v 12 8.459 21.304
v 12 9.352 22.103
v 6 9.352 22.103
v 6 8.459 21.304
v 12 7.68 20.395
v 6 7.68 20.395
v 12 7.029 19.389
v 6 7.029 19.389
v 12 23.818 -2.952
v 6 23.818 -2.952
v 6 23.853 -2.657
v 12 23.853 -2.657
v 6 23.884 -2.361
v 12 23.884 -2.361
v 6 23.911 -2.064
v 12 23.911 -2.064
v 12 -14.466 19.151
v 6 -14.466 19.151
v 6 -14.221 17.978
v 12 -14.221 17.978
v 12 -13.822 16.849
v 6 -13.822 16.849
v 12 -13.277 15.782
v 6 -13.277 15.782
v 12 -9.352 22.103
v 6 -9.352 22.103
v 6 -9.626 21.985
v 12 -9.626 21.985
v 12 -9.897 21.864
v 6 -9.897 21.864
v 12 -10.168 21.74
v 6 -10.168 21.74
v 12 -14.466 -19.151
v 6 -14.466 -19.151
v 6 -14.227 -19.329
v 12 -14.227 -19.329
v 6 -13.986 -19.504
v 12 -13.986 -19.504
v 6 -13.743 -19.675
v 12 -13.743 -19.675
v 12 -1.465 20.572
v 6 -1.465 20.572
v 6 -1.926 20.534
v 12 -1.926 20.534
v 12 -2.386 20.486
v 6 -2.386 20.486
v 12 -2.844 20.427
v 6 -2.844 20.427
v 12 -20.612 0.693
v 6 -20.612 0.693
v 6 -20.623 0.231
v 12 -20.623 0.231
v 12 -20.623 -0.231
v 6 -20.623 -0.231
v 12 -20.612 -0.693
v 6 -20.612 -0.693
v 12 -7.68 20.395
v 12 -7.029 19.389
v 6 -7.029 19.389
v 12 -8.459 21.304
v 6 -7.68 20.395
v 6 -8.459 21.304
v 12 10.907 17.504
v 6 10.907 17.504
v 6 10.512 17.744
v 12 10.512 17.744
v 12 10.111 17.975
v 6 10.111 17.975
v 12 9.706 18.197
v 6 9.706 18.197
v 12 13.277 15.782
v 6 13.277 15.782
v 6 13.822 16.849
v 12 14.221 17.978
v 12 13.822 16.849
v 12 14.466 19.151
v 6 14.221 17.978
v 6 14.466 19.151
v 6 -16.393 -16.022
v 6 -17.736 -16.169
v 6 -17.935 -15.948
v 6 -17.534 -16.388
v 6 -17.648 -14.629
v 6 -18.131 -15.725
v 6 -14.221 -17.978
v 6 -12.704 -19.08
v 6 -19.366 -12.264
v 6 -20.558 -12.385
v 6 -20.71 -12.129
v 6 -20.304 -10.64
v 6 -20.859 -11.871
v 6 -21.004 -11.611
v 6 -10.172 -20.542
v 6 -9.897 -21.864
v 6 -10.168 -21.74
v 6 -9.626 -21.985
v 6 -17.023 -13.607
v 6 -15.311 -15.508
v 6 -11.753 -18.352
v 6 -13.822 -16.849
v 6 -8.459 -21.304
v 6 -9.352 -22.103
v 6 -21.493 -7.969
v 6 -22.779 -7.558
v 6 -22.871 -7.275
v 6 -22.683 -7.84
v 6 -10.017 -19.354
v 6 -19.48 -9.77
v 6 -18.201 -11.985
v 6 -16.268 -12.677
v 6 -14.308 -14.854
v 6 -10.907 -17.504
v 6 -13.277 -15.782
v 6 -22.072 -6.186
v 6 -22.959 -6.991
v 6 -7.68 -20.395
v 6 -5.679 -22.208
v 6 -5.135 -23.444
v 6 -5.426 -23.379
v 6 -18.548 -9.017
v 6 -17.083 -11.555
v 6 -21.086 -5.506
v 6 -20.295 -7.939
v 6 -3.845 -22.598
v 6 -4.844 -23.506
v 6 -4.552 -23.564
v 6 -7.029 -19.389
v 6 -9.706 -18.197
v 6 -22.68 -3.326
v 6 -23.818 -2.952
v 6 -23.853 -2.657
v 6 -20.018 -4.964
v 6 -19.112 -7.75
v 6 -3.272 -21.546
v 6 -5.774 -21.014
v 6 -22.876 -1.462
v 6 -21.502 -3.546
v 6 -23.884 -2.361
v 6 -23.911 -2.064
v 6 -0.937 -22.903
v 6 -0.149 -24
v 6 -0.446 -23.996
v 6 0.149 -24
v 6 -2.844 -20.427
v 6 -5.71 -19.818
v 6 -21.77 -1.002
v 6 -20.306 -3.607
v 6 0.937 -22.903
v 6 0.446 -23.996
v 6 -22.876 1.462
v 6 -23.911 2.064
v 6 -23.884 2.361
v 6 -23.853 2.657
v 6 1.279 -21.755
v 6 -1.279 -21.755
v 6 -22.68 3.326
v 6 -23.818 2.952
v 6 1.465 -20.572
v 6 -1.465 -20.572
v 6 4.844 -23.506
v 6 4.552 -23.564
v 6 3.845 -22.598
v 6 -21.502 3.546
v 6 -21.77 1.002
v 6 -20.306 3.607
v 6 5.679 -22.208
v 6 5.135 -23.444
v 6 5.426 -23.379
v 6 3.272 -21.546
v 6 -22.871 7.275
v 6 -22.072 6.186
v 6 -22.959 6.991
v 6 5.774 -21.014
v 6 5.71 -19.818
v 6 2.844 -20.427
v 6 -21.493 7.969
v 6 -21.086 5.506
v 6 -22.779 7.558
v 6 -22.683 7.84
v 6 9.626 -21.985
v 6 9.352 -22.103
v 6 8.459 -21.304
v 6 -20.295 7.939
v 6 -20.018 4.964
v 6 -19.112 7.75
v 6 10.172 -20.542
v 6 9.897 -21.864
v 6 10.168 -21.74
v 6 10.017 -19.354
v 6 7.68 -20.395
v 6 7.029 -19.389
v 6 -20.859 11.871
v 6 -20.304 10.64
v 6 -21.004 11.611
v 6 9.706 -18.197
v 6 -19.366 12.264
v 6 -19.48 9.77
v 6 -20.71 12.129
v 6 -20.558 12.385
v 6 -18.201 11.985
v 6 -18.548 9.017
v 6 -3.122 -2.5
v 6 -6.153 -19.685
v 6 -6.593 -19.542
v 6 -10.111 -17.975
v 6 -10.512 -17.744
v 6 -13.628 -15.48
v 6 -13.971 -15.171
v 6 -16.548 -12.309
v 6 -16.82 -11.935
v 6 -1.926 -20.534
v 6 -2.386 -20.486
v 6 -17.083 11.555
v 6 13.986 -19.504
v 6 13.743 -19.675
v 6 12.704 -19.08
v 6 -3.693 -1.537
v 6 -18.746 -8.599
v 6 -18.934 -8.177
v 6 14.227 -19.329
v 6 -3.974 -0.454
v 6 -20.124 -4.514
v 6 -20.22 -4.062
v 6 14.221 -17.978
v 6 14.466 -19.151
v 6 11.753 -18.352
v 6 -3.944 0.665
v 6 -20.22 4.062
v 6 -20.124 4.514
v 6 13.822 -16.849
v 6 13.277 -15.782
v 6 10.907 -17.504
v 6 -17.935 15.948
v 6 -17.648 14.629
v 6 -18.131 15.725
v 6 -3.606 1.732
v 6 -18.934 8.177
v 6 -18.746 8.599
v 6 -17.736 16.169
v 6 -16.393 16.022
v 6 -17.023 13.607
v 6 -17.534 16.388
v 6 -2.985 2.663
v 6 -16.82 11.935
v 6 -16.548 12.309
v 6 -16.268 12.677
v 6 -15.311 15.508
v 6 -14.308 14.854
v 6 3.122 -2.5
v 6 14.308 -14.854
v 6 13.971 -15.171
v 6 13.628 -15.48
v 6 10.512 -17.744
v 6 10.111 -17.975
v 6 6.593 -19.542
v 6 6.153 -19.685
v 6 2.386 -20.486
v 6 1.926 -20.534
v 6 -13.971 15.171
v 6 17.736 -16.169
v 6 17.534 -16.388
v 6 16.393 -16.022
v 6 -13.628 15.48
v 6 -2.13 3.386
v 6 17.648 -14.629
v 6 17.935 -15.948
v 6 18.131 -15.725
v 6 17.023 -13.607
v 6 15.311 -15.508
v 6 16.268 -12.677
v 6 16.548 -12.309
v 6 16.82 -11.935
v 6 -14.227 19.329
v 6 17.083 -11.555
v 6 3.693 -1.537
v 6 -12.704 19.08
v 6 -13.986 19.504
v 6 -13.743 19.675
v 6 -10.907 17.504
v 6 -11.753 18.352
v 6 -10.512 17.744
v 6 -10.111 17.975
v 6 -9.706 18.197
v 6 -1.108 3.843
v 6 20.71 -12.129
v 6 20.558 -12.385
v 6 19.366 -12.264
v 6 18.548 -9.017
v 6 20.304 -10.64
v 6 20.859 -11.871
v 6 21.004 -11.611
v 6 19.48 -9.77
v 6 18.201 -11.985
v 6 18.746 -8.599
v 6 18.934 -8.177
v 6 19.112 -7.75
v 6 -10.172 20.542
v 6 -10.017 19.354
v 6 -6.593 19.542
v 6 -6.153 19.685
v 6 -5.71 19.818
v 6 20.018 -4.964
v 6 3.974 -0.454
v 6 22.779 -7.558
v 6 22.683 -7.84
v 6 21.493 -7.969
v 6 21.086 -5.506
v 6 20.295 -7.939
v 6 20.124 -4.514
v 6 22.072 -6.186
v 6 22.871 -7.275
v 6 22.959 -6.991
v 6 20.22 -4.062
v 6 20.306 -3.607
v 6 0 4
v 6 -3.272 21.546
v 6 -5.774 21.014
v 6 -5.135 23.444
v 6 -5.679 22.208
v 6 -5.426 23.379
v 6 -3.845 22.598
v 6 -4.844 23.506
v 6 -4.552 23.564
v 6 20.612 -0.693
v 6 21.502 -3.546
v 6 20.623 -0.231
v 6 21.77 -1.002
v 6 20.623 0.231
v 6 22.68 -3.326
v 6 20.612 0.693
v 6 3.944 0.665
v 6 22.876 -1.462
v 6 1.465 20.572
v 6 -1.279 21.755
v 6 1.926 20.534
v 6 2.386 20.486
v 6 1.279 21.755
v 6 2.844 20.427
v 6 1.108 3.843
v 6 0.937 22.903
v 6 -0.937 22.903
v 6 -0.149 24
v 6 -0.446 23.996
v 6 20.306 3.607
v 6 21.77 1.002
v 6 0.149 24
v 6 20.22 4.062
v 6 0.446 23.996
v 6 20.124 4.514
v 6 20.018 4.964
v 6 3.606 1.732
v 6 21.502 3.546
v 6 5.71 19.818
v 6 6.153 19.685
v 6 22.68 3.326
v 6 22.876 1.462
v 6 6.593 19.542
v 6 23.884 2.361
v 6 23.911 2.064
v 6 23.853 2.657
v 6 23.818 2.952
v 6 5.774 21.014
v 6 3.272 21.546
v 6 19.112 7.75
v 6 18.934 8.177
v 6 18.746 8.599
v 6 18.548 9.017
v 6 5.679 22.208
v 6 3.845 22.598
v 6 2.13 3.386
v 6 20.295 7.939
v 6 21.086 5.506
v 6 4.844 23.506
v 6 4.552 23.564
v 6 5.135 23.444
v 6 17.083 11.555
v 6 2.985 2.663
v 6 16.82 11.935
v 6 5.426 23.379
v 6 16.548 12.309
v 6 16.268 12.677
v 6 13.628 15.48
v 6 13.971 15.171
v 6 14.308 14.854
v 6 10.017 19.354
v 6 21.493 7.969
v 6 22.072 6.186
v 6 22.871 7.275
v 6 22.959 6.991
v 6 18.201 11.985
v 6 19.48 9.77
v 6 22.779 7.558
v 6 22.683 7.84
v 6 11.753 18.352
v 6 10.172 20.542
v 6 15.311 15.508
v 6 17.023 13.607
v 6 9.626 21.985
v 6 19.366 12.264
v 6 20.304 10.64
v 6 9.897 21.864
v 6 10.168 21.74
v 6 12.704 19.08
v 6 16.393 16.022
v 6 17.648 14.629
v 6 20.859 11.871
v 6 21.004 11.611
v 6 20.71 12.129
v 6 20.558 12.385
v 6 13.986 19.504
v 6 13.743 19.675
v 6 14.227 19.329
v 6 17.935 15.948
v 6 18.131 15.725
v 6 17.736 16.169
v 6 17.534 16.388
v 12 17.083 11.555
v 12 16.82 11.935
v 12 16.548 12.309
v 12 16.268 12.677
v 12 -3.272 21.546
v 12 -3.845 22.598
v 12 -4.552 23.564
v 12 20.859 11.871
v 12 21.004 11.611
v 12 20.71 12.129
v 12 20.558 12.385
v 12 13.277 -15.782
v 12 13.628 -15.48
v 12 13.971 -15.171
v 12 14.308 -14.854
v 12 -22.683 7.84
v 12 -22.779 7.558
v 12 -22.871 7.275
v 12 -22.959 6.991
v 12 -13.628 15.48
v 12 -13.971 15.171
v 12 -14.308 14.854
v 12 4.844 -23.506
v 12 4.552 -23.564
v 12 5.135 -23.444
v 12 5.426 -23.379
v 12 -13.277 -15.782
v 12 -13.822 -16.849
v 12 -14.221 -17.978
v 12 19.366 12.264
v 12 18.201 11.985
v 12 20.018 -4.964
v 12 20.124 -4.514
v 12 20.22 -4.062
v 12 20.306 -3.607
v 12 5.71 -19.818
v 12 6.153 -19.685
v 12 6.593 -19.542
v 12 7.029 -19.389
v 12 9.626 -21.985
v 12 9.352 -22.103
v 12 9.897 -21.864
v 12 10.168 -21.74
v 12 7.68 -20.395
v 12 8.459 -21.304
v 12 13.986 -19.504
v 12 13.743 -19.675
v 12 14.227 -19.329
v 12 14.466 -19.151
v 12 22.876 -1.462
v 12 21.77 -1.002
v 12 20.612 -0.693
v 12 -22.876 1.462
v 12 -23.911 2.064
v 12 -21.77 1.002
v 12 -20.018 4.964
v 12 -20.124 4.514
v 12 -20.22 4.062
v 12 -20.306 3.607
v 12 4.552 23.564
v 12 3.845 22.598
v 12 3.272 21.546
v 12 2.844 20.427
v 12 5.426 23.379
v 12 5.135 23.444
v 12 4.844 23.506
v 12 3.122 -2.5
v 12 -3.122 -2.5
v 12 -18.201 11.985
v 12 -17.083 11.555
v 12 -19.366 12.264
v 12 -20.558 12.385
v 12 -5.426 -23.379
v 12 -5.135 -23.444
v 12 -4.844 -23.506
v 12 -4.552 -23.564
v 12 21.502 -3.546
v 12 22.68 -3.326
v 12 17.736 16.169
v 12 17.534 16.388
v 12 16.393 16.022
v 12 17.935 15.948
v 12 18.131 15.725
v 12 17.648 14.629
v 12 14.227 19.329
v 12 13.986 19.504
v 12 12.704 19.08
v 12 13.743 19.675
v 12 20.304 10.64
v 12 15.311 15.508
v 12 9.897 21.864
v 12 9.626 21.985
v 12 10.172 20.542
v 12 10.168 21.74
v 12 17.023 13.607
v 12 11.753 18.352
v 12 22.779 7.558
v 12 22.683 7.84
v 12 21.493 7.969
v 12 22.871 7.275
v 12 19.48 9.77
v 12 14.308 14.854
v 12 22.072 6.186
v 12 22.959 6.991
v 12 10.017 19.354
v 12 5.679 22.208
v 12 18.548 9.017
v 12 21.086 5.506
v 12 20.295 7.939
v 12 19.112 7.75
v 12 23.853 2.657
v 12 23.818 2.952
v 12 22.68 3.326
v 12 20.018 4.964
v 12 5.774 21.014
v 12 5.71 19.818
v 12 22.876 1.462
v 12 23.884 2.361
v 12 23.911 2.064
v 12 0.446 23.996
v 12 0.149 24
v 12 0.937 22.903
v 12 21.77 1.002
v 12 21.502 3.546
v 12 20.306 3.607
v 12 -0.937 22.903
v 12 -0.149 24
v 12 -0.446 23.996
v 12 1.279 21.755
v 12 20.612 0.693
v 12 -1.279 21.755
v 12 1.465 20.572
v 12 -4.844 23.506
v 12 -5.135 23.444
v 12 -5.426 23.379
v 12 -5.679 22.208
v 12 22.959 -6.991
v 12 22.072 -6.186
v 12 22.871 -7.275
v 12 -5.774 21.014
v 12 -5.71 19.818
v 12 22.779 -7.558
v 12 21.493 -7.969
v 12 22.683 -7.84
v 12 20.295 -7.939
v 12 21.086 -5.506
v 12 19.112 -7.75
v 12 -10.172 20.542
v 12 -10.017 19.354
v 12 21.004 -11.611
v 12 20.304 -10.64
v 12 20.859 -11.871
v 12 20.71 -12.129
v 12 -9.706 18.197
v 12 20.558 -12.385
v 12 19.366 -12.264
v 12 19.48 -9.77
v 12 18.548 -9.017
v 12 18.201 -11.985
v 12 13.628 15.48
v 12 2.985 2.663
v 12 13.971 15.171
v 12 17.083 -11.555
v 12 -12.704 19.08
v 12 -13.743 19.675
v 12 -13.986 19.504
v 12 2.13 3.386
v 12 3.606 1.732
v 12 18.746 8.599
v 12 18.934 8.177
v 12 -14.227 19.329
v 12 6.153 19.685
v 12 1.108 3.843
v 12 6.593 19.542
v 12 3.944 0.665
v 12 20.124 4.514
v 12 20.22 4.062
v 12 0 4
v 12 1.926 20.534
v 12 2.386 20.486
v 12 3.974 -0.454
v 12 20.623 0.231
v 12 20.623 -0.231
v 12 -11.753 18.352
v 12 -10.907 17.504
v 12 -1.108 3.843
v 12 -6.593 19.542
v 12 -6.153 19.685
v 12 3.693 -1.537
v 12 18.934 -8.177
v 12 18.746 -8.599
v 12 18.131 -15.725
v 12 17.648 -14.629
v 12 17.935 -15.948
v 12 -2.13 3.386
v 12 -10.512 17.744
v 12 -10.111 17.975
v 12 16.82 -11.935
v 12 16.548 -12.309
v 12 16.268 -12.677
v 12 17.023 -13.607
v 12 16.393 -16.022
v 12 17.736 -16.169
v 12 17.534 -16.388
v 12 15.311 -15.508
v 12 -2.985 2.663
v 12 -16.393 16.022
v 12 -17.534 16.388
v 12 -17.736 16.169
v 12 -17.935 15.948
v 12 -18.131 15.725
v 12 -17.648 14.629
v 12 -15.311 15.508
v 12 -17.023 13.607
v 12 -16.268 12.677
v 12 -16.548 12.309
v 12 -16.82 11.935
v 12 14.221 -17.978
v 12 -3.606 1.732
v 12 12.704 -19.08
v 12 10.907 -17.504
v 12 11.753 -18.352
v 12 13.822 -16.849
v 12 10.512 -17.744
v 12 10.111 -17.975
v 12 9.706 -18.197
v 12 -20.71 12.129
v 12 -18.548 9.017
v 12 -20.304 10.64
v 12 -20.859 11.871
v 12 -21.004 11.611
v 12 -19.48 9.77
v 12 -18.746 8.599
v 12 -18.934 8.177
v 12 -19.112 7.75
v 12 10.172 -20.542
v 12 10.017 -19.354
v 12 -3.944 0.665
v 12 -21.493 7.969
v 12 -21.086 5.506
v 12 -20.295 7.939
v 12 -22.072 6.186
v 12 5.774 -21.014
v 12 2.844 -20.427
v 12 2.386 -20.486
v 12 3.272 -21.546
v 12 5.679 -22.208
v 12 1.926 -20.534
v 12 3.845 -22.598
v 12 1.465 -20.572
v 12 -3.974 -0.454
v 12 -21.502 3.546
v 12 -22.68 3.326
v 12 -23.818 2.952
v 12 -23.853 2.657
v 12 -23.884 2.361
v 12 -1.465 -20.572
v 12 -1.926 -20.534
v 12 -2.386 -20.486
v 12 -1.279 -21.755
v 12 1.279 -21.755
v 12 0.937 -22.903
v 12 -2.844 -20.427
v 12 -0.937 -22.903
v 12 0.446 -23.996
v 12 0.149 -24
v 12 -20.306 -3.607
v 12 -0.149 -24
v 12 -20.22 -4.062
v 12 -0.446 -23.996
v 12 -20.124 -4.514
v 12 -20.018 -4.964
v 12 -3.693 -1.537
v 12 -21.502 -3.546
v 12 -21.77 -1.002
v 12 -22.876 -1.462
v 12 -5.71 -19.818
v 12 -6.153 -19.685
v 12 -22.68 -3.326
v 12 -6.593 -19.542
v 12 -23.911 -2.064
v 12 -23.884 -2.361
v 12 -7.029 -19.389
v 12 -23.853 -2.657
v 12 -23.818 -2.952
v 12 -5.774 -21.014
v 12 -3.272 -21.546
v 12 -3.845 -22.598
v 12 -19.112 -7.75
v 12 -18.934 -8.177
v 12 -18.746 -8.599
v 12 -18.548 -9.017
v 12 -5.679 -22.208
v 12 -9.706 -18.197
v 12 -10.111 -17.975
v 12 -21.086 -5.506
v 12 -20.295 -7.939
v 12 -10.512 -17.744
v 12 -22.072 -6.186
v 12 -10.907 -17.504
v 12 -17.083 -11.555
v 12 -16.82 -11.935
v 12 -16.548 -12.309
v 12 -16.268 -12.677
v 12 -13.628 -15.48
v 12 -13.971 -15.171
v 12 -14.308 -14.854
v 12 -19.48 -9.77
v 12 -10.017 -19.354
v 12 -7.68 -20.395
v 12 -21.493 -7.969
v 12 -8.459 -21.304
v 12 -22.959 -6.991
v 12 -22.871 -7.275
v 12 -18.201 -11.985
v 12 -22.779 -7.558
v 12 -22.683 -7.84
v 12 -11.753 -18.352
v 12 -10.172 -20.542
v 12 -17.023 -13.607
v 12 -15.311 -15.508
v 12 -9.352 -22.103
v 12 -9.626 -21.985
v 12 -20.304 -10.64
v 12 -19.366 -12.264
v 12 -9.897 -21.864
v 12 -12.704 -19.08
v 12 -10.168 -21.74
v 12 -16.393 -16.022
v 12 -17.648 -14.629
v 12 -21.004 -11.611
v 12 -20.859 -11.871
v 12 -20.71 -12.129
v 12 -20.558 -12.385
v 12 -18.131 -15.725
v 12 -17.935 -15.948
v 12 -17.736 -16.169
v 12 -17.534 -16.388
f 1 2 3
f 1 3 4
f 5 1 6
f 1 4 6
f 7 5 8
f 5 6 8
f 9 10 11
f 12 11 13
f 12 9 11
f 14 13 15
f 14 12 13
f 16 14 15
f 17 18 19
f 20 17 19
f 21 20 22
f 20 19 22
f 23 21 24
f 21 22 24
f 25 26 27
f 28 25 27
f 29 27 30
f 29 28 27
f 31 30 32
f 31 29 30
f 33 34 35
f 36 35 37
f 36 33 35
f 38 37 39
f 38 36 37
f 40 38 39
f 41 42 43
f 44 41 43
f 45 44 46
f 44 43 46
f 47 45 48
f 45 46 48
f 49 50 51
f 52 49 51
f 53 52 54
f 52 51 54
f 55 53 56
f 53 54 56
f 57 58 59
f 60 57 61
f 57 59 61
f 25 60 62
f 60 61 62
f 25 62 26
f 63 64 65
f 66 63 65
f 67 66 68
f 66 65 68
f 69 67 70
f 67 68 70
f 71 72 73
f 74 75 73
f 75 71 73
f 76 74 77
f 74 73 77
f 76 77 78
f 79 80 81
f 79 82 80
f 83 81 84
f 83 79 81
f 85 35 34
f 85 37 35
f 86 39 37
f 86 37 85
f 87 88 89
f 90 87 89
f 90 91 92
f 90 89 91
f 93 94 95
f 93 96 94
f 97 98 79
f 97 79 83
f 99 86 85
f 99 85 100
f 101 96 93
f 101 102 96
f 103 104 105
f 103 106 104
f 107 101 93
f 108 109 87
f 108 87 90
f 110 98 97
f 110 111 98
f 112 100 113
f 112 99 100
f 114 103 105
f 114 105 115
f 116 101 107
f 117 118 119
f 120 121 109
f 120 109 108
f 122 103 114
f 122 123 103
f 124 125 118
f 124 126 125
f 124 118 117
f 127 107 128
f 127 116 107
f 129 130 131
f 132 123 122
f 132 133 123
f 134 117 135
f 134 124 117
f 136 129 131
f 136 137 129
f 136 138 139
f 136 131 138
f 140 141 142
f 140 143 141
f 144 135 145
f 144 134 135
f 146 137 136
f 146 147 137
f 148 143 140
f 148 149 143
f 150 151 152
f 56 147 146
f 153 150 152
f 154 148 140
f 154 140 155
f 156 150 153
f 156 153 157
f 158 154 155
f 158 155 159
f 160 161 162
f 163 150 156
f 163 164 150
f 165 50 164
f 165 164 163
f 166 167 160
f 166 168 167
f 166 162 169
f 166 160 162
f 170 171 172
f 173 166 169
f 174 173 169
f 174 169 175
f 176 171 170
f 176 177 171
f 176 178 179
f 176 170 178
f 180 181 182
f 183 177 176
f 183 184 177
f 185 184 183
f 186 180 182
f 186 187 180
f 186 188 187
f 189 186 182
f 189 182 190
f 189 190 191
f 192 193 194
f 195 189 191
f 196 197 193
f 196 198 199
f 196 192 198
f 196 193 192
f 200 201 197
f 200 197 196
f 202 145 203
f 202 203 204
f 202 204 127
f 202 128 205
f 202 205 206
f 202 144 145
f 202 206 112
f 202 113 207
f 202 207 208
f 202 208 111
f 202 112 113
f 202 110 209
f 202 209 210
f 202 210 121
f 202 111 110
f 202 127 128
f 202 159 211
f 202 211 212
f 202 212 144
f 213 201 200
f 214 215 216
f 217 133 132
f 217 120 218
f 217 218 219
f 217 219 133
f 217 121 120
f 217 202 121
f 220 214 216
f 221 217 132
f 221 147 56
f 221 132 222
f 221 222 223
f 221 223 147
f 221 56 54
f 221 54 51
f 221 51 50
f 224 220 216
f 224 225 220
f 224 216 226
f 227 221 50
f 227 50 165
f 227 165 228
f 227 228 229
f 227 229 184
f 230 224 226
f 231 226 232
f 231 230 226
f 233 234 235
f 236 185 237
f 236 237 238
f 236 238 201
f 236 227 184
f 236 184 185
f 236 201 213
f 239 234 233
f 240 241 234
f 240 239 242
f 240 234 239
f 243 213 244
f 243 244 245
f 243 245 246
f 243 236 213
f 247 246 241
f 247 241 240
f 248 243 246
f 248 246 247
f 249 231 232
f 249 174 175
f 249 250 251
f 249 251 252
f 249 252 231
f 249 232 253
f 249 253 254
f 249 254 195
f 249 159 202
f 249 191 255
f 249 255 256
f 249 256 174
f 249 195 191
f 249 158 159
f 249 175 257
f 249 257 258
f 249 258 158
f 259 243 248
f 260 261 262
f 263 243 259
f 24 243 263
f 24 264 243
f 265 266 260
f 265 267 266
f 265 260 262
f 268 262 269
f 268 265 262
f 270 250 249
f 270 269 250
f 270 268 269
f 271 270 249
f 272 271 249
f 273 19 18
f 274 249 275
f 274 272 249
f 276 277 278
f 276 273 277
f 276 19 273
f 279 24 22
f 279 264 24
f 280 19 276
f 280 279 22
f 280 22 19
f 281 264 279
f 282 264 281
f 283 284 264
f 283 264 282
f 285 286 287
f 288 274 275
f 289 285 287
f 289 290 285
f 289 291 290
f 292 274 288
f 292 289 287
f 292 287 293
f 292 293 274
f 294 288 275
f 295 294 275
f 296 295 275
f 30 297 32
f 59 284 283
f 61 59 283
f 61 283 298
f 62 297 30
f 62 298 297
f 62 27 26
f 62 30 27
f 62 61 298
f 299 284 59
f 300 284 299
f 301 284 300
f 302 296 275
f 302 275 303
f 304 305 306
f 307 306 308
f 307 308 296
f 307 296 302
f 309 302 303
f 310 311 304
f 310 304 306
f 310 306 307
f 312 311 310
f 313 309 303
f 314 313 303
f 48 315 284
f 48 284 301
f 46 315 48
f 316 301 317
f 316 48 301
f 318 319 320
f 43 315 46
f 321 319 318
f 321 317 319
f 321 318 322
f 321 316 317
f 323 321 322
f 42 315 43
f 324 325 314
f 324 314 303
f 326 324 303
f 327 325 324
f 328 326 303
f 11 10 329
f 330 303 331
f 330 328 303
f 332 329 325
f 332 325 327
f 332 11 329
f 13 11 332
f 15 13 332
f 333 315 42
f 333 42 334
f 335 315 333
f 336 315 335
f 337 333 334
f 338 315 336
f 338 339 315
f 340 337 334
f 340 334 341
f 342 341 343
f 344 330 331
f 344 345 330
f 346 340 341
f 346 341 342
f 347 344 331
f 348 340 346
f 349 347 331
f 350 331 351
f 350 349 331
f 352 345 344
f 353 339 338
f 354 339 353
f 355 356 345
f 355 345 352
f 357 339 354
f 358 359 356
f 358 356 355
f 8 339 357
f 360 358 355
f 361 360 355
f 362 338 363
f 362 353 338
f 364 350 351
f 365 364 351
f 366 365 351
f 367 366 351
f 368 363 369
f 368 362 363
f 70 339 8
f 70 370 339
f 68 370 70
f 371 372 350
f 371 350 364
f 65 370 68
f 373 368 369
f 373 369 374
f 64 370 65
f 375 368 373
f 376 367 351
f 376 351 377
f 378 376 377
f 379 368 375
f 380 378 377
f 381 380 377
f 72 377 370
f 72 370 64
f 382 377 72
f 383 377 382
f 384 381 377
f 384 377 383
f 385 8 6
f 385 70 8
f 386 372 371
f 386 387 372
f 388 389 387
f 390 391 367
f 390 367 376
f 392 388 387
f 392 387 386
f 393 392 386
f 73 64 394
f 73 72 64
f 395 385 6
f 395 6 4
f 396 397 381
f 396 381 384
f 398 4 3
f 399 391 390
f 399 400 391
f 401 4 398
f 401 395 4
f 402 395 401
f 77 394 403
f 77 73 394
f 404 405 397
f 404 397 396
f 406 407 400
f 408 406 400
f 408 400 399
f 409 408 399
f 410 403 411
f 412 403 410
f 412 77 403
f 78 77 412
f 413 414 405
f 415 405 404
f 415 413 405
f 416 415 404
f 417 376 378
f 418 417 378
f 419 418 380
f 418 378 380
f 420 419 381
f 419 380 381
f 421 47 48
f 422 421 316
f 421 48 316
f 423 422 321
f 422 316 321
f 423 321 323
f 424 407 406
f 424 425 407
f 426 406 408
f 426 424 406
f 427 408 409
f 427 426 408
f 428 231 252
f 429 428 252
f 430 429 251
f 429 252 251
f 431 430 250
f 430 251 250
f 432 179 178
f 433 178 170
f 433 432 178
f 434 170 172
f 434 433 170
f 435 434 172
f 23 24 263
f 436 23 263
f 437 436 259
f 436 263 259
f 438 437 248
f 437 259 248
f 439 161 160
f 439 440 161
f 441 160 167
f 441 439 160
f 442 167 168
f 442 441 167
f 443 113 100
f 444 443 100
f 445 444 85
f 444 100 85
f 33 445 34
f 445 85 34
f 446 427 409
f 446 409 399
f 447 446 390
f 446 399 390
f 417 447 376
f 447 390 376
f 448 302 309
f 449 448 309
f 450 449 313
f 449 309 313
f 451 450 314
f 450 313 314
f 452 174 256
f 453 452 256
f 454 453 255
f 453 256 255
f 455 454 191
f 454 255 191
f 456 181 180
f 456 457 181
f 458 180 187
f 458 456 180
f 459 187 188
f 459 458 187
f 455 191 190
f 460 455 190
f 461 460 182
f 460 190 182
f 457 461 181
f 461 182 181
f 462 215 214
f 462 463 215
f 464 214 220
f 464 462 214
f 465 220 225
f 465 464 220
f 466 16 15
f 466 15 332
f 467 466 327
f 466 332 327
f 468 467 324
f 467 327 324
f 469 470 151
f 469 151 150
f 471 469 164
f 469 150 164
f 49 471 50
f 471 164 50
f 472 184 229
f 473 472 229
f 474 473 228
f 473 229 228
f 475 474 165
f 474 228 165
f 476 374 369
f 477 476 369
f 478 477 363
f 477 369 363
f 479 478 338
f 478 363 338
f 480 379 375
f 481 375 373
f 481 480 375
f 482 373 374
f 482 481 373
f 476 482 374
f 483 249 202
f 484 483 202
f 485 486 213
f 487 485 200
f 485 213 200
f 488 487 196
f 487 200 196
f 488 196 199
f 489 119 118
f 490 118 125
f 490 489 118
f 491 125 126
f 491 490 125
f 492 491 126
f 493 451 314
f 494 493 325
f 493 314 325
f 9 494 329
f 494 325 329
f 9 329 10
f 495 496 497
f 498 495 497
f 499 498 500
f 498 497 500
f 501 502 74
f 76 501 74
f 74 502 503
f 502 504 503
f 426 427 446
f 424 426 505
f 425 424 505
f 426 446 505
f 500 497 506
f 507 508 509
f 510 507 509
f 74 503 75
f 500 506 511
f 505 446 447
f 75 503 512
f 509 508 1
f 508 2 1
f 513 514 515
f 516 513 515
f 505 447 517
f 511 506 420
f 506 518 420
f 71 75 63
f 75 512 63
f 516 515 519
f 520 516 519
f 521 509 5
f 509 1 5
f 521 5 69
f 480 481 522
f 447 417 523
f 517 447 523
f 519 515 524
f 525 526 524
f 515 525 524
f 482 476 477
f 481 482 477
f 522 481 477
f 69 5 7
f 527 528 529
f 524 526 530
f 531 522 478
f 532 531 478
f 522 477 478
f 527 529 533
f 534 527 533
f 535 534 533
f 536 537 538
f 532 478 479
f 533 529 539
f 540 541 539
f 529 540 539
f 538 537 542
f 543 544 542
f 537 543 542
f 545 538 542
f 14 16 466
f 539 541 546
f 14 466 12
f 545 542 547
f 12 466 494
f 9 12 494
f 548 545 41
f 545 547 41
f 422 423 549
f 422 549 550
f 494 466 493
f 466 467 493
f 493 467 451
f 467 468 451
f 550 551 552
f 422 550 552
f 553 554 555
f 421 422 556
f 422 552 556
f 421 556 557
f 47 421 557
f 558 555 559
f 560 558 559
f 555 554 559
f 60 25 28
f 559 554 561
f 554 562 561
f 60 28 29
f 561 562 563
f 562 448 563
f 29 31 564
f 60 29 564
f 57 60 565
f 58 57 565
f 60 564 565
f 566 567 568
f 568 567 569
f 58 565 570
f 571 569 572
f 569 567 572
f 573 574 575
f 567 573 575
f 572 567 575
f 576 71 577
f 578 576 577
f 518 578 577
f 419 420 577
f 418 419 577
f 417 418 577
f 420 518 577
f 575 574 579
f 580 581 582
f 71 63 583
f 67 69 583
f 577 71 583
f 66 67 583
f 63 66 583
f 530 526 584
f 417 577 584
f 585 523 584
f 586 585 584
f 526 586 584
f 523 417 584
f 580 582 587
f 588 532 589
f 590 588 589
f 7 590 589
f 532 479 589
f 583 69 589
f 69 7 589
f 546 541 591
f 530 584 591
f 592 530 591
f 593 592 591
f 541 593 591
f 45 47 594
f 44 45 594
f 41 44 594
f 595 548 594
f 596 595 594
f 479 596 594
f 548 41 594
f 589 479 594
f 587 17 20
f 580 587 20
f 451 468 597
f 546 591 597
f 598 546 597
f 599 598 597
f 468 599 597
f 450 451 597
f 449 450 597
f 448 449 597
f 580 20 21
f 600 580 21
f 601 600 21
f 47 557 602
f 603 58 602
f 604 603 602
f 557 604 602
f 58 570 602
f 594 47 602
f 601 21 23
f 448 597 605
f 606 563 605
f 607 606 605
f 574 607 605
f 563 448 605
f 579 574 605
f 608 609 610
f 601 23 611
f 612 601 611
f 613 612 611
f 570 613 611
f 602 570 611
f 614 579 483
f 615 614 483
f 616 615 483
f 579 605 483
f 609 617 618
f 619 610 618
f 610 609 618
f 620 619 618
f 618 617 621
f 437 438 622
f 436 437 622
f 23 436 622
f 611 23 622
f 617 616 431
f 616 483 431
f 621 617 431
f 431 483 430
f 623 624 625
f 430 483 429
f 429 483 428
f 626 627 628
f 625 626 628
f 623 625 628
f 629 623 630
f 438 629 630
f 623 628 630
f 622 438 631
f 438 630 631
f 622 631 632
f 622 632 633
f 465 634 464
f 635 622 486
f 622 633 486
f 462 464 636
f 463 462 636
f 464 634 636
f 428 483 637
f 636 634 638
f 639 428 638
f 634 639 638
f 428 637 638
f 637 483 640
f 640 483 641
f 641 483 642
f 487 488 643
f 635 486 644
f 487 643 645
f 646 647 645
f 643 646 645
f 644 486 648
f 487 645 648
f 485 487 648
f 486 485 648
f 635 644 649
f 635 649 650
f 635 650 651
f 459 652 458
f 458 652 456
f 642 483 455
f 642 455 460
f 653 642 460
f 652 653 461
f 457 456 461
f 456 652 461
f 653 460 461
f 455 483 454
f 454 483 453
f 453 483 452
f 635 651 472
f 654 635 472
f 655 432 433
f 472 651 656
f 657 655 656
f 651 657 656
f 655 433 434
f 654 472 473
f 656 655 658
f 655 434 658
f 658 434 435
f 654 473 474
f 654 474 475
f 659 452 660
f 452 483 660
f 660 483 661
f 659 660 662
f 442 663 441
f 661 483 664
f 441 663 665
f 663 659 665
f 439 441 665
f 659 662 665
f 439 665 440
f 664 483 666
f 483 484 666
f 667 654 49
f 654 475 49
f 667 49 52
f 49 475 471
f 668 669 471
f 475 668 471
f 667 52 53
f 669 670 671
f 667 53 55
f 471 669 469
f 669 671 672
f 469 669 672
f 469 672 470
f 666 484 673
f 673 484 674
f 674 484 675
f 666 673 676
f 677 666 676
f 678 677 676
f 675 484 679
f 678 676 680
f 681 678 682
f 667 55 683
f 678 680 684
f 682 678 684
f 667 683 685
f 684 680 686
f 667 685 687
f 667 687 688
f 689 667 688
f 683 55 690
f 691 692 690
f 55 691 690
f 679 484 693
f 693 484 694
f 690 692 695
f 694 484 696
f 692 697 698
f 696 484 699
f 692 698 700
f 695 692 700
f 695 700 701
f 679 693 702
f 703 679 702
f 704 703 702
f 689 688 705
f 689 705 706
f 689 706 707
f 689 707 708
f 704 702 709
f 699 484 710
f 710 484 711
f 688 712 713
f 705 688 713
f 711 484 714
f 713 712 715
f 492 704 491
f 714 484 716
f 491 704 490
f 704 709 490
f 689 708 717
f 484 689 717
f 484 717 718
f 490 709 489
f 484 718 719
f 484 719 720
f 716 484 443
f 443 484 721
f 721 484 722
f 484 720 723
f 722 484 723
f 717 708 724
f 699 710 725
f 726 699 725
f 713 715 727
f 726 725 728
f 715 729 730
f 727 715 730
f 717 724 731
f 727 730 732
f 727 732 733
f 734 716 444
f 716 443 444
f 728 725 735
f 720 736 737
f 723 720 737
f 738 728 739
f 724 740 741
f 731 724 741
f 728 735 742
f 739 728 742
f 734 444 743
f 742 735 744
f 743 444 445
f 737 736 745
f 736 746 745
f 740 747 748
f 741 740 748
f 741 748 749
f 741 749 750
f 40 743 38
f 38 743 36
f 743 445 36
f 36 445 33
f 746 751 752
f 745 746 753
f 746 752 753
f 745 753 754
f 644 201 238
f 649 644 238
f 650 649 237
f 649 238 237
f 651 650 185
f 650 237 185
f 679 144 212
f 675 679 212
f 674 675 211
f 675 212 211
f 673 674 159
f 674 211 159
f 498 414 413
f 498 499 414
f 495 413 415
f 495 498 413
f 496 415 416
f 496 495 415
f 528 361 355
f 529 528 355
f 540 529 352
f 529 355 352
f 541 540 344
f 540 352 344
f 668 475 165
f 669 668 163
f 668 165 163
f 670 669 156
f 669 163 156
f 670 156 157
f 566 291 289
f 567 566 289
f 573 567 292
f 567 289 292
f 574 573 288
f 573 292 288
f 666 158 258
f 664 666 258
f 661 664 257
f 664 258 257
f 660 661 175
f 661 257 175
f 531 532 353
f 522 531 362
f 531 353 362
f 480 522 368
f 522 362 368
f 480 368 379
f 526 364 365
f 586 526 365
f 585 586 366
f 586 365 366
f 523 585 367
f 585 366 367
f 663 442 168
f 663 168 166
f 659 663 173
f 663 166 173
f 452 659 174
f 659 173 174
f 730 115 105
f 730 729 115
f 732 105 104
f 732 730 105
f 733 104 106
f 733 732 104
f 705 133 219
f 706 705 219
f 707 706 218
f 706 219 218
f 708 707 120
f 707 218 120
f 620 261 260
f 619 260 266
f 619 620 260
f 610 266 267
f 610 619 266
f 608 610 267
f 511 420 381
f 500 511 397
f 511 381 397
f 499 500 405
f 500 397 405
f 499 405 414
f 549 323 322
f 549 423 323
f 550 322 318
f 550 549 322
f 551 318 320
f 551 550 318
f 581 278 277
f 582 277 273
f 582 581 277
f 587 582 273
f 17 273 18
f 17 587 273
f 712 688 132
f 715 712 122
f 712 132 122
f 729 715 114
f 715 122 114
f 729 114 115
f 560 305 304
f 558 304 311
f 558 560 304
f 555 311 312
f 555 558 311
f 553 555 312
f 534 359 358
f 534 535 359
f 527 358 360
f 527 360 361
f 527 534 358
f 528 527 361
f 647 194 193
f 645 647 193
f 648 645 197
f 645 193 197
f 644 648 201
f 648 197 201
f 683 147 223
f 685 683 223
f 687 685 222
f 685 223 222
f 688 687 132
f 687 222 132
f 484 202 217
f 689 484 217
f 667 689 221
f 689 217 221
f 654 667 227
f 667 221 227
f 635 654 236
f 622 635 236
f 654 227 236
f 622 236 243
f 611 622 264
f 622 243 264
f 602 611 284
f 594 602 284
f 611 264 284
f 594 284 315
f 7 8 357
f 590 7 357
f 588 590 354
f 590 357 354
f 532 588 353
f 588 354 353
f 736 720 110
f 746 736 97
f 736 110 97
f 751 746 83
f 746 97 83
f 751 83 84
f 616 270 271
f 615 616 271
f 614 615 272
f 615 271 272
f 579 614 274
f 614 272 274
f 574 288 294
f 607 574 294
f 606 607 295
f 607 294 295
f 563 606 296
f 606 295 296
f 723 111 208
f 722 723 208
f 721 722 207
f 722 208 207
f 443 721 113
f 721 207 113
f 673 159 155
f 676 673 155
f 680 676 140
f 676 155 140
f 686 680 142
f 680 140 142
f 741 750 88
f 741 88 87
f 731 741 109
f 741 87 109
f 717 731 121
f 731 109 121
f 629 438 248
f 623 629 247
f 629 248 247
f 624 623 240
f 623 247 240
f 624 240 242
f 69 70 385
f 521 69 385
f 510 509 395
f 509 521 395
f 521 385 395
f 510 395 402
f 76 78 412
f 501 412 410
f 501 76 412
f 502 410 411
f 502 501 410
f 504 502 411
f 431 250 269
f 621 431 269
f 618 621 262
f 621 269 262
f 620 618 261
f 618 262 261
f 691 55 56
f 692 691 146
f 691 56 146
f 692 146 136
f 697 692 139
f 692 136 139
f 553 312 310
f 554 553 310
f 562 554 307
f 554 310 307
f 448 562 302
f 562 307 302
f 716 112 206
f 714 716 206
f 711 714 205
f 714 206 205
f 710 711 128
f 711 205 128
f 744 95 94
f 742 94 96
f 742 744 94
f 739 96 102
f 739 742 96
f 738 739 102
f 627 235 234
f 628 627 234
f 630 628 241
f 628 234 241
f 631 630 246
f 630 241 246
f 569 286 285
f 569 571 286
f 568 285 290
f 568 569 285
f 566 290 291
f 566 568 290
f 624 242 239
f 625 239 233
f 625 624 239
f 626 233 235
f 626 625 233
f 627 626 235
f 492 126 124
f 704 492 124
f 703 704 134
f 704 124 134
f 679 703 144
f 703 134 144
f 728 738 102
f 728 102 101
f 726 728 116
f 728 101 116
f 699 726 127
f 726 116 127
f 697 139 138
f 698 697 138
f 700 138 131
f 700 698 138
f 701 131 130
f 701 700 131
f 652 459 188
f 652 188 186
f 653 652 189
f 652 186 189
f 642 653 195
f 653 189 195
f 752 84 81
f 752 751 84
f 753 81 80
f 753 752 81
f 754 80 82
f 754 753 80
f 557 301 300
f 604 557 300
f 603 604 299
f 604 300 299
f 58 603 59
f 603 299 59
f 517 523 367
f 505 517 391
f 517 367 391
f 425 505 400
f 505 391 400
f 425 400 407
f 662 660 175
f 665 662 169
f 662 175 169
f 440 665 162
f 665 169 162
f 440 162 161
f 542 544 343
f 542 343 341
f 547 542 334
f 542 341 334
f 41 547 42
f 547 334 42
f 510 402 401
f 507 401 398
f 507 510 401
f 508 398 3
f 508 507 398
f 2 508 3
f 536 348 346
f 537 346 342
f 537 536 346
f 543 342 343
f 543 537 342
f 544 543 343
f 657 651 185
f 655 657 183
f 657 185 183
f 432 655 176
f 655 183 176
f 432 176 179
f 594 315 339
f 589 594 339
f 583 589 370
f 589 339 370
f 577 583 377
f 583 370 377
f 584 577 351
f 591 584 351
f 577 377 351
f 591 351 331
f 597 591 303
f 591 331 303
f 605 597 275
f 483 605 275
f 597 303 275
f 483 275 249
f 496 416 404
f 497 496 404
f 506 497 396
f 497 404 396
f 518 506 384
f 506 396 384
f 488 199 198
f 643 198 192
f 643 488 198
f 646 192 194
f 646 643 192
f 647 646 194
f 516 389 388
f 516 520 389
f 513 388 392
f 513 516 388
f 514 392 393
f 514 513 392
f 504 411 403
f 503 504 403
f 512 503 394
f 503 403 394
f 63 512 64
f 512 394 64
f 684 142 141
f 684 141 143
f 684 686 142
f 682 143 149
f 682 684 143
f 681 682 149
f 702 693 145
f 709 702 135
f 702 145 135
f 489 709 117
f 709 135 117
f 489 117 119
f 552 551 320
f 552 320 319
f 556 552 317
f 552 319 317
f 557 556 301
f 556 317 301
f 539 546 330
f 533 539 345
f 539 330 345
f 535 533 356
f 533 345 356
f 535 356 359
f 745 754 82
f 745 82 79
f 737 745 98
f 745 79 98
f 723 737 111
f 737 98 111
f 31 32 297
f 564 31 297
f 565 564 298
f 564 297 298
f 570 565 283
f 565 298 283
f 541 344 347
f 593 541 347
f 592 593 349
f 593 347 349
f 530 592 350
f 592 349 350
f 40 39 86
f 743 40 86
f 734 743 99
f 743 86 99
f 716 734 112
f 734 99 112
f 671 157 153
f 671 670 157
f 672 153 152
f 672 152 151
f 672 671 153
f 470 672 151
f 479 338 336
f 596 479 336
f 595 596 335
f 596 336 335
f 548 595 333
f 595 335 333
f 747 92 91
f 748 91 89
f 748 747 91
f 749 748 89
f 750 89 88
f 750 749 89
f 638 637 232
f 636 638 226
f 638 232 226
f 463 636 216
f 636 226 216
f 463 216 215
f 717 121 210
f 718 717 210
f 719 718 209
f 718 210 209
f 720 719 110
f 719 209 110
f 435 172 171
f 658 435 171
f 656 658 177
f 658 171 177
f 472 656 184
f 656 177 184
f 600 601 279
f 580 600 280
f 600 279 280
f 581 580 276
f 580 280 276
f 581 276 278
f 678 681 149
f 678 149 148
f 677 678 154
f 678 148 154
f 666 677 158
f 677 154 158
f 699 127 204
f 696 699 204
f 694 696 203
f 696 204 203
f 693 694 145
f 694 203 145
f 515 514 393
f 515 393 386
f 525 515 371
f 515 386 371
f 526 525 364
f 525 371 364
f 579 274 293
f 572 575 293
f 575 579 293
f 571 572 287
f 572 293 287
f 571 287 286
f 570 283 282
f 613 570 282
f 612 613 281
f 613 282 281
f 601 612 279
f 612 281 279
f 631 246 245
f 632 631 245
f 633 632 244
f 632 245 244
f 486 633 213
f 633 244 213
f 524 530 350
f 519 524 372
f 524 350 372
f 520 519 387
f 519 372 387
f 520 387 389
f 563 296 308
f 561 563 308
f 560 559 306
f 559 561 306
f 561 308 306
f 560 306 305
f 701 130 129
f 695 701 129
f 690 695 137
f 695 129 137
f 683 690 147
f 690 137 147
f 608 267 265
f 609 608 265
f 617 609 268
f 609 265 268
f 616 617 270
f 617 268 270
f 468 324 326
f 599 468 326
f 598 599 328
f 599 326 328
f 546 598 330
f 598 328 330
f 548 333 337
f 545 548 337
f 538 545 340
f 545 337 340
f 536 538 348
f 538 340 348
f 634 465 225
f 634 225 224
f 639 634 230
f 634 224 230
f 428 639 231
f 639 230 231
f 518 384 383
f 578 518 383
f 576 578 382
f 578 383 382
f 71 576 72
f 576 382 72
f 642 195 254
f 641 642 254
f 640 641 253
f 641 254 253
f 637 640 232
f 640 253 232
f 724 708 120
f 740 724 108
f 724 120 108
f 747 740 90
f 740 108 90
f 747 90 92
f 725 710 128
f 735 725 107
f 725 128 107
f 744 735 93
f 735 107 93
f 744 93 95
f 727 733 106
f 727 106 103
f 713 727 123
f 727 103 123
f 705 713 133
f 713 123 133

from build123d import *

# Parameters (mm, degrees)
BASPROSKE_W        = 12
BASPROSKE_H        = 24
TOOTHCUT_DEPTH     = 37
TEETHCUTS_COUNT    = 30
TEETHCUTS_ANGLE    = 348
BORSKE_R           = 0.4
BORE_DEPTH         = 50.0000508
SKETCH1_R          = 33.841637192
CUT_EXTRUDE1_DEPTH = 6
CUT_EXTRUDE2_DEPTH = 6


with BuildPart() as part:
    # BasProSke → Base-Revolve (revolve)
    with BuildSketch(Plane(origin=(0, 0, 0), x_dir=(1, 0, 0), z_dir=(0, 1, 0)), mode=Mode.PRIVATE) as base_revolve_sk:
        with Locations((6, 12)):
            Rectangle(BASPROSKE_W, BASPROSKE_H)
    revolve(base_revolve_sk.sketch.rotate(Axis((-10, 0, 0), (1, 0, 0)), 180), axis=Axis((-10, 0, 0), (1, 0, 0)))

    # TooCutSke → ToothCut (cut, through all)
    with BuildSketch(Plane(origin=(0, 0, 0), x_dir=(0, 0, -1), z_dir=(1, 0, 0))):
        with BuildLine():
            ThreePointArc((0.693278797, 20.612344372), (0, 20.624), (-0.693278797, 20.612344372))
            ThreePointArc((-0.693278797, 20.612344372), (-1.219042225, 22.34383125), (-2.080549663, 23.935144835))
            ThreePointArc((-2.080549663, 23.935144835), (0, 24.0254), (2.080549663, 23.935144835))
            ThreePointArc((2.080549663, 23.935144835), (1.219042225, 22.34383125), (0.693278797, 20.612344372))
        make_face()
    toothcut = extrude(amount=TOOTHCUT_DEPTH, mode=Mode.SUBTRACT)

    # TeethCuts: ToothCut ×30 about axis
    teethcuts_axis = Axis((-10, 0, 0), (1, 0, 0))
    for i in range(1, TEETHCUTS_COUNT):
        add(toothcut.rotate(teethcuts_axis, i * TEETHCUTS_ANGLE / (TEETHCUTS_COUNT - 1)), mode=Mode.SUBTRACT)

    # BorSke → Bore (cut, symmetric)
    with BuildSketch(Plane(origin=(0, 0, 0), x_dir=(0, 0, -1), z_dir=(1, 0, 0))):
        with Locations(Location((0, 0, 0), (0, 0, 180))):
            Circle(BORSKE_R)
    extrude(amount=BORE_DEPTH, both=True, mode=Mode.SUBTRACT)

    # Sketch1 → Cut-Extrude1 (cut)
    with BuildSketch(Plane.ZY):
        with Locations((-0.4, 0)):
            Circle(SKETCH1_R)
    extrude(amount=-CUT_EXTRUDE1_DEPTH, mode=Mode.SUBTRACT)

    # Sketch2 → Cut-Extrude2 (cut)
    with BuildSketch(Plane.ZY.offset(-6)):
        with BuildLine():
            ThreePointArc((4, 0), (1.732050808, 3.605551275), (-2.5, 3.122498999))
            Line((-2.5, 3.122498999), (-2.5, -3.122498999))
            ThreePointArc((-2.5, -3.122498999), (1.732050808, -3.605551275), (4, 0))
        make_face()
    extrude(amount=-CUT_EXTRUDE2_DEPTH, mode=Mode.SUBTRACT)


solid = part.part
